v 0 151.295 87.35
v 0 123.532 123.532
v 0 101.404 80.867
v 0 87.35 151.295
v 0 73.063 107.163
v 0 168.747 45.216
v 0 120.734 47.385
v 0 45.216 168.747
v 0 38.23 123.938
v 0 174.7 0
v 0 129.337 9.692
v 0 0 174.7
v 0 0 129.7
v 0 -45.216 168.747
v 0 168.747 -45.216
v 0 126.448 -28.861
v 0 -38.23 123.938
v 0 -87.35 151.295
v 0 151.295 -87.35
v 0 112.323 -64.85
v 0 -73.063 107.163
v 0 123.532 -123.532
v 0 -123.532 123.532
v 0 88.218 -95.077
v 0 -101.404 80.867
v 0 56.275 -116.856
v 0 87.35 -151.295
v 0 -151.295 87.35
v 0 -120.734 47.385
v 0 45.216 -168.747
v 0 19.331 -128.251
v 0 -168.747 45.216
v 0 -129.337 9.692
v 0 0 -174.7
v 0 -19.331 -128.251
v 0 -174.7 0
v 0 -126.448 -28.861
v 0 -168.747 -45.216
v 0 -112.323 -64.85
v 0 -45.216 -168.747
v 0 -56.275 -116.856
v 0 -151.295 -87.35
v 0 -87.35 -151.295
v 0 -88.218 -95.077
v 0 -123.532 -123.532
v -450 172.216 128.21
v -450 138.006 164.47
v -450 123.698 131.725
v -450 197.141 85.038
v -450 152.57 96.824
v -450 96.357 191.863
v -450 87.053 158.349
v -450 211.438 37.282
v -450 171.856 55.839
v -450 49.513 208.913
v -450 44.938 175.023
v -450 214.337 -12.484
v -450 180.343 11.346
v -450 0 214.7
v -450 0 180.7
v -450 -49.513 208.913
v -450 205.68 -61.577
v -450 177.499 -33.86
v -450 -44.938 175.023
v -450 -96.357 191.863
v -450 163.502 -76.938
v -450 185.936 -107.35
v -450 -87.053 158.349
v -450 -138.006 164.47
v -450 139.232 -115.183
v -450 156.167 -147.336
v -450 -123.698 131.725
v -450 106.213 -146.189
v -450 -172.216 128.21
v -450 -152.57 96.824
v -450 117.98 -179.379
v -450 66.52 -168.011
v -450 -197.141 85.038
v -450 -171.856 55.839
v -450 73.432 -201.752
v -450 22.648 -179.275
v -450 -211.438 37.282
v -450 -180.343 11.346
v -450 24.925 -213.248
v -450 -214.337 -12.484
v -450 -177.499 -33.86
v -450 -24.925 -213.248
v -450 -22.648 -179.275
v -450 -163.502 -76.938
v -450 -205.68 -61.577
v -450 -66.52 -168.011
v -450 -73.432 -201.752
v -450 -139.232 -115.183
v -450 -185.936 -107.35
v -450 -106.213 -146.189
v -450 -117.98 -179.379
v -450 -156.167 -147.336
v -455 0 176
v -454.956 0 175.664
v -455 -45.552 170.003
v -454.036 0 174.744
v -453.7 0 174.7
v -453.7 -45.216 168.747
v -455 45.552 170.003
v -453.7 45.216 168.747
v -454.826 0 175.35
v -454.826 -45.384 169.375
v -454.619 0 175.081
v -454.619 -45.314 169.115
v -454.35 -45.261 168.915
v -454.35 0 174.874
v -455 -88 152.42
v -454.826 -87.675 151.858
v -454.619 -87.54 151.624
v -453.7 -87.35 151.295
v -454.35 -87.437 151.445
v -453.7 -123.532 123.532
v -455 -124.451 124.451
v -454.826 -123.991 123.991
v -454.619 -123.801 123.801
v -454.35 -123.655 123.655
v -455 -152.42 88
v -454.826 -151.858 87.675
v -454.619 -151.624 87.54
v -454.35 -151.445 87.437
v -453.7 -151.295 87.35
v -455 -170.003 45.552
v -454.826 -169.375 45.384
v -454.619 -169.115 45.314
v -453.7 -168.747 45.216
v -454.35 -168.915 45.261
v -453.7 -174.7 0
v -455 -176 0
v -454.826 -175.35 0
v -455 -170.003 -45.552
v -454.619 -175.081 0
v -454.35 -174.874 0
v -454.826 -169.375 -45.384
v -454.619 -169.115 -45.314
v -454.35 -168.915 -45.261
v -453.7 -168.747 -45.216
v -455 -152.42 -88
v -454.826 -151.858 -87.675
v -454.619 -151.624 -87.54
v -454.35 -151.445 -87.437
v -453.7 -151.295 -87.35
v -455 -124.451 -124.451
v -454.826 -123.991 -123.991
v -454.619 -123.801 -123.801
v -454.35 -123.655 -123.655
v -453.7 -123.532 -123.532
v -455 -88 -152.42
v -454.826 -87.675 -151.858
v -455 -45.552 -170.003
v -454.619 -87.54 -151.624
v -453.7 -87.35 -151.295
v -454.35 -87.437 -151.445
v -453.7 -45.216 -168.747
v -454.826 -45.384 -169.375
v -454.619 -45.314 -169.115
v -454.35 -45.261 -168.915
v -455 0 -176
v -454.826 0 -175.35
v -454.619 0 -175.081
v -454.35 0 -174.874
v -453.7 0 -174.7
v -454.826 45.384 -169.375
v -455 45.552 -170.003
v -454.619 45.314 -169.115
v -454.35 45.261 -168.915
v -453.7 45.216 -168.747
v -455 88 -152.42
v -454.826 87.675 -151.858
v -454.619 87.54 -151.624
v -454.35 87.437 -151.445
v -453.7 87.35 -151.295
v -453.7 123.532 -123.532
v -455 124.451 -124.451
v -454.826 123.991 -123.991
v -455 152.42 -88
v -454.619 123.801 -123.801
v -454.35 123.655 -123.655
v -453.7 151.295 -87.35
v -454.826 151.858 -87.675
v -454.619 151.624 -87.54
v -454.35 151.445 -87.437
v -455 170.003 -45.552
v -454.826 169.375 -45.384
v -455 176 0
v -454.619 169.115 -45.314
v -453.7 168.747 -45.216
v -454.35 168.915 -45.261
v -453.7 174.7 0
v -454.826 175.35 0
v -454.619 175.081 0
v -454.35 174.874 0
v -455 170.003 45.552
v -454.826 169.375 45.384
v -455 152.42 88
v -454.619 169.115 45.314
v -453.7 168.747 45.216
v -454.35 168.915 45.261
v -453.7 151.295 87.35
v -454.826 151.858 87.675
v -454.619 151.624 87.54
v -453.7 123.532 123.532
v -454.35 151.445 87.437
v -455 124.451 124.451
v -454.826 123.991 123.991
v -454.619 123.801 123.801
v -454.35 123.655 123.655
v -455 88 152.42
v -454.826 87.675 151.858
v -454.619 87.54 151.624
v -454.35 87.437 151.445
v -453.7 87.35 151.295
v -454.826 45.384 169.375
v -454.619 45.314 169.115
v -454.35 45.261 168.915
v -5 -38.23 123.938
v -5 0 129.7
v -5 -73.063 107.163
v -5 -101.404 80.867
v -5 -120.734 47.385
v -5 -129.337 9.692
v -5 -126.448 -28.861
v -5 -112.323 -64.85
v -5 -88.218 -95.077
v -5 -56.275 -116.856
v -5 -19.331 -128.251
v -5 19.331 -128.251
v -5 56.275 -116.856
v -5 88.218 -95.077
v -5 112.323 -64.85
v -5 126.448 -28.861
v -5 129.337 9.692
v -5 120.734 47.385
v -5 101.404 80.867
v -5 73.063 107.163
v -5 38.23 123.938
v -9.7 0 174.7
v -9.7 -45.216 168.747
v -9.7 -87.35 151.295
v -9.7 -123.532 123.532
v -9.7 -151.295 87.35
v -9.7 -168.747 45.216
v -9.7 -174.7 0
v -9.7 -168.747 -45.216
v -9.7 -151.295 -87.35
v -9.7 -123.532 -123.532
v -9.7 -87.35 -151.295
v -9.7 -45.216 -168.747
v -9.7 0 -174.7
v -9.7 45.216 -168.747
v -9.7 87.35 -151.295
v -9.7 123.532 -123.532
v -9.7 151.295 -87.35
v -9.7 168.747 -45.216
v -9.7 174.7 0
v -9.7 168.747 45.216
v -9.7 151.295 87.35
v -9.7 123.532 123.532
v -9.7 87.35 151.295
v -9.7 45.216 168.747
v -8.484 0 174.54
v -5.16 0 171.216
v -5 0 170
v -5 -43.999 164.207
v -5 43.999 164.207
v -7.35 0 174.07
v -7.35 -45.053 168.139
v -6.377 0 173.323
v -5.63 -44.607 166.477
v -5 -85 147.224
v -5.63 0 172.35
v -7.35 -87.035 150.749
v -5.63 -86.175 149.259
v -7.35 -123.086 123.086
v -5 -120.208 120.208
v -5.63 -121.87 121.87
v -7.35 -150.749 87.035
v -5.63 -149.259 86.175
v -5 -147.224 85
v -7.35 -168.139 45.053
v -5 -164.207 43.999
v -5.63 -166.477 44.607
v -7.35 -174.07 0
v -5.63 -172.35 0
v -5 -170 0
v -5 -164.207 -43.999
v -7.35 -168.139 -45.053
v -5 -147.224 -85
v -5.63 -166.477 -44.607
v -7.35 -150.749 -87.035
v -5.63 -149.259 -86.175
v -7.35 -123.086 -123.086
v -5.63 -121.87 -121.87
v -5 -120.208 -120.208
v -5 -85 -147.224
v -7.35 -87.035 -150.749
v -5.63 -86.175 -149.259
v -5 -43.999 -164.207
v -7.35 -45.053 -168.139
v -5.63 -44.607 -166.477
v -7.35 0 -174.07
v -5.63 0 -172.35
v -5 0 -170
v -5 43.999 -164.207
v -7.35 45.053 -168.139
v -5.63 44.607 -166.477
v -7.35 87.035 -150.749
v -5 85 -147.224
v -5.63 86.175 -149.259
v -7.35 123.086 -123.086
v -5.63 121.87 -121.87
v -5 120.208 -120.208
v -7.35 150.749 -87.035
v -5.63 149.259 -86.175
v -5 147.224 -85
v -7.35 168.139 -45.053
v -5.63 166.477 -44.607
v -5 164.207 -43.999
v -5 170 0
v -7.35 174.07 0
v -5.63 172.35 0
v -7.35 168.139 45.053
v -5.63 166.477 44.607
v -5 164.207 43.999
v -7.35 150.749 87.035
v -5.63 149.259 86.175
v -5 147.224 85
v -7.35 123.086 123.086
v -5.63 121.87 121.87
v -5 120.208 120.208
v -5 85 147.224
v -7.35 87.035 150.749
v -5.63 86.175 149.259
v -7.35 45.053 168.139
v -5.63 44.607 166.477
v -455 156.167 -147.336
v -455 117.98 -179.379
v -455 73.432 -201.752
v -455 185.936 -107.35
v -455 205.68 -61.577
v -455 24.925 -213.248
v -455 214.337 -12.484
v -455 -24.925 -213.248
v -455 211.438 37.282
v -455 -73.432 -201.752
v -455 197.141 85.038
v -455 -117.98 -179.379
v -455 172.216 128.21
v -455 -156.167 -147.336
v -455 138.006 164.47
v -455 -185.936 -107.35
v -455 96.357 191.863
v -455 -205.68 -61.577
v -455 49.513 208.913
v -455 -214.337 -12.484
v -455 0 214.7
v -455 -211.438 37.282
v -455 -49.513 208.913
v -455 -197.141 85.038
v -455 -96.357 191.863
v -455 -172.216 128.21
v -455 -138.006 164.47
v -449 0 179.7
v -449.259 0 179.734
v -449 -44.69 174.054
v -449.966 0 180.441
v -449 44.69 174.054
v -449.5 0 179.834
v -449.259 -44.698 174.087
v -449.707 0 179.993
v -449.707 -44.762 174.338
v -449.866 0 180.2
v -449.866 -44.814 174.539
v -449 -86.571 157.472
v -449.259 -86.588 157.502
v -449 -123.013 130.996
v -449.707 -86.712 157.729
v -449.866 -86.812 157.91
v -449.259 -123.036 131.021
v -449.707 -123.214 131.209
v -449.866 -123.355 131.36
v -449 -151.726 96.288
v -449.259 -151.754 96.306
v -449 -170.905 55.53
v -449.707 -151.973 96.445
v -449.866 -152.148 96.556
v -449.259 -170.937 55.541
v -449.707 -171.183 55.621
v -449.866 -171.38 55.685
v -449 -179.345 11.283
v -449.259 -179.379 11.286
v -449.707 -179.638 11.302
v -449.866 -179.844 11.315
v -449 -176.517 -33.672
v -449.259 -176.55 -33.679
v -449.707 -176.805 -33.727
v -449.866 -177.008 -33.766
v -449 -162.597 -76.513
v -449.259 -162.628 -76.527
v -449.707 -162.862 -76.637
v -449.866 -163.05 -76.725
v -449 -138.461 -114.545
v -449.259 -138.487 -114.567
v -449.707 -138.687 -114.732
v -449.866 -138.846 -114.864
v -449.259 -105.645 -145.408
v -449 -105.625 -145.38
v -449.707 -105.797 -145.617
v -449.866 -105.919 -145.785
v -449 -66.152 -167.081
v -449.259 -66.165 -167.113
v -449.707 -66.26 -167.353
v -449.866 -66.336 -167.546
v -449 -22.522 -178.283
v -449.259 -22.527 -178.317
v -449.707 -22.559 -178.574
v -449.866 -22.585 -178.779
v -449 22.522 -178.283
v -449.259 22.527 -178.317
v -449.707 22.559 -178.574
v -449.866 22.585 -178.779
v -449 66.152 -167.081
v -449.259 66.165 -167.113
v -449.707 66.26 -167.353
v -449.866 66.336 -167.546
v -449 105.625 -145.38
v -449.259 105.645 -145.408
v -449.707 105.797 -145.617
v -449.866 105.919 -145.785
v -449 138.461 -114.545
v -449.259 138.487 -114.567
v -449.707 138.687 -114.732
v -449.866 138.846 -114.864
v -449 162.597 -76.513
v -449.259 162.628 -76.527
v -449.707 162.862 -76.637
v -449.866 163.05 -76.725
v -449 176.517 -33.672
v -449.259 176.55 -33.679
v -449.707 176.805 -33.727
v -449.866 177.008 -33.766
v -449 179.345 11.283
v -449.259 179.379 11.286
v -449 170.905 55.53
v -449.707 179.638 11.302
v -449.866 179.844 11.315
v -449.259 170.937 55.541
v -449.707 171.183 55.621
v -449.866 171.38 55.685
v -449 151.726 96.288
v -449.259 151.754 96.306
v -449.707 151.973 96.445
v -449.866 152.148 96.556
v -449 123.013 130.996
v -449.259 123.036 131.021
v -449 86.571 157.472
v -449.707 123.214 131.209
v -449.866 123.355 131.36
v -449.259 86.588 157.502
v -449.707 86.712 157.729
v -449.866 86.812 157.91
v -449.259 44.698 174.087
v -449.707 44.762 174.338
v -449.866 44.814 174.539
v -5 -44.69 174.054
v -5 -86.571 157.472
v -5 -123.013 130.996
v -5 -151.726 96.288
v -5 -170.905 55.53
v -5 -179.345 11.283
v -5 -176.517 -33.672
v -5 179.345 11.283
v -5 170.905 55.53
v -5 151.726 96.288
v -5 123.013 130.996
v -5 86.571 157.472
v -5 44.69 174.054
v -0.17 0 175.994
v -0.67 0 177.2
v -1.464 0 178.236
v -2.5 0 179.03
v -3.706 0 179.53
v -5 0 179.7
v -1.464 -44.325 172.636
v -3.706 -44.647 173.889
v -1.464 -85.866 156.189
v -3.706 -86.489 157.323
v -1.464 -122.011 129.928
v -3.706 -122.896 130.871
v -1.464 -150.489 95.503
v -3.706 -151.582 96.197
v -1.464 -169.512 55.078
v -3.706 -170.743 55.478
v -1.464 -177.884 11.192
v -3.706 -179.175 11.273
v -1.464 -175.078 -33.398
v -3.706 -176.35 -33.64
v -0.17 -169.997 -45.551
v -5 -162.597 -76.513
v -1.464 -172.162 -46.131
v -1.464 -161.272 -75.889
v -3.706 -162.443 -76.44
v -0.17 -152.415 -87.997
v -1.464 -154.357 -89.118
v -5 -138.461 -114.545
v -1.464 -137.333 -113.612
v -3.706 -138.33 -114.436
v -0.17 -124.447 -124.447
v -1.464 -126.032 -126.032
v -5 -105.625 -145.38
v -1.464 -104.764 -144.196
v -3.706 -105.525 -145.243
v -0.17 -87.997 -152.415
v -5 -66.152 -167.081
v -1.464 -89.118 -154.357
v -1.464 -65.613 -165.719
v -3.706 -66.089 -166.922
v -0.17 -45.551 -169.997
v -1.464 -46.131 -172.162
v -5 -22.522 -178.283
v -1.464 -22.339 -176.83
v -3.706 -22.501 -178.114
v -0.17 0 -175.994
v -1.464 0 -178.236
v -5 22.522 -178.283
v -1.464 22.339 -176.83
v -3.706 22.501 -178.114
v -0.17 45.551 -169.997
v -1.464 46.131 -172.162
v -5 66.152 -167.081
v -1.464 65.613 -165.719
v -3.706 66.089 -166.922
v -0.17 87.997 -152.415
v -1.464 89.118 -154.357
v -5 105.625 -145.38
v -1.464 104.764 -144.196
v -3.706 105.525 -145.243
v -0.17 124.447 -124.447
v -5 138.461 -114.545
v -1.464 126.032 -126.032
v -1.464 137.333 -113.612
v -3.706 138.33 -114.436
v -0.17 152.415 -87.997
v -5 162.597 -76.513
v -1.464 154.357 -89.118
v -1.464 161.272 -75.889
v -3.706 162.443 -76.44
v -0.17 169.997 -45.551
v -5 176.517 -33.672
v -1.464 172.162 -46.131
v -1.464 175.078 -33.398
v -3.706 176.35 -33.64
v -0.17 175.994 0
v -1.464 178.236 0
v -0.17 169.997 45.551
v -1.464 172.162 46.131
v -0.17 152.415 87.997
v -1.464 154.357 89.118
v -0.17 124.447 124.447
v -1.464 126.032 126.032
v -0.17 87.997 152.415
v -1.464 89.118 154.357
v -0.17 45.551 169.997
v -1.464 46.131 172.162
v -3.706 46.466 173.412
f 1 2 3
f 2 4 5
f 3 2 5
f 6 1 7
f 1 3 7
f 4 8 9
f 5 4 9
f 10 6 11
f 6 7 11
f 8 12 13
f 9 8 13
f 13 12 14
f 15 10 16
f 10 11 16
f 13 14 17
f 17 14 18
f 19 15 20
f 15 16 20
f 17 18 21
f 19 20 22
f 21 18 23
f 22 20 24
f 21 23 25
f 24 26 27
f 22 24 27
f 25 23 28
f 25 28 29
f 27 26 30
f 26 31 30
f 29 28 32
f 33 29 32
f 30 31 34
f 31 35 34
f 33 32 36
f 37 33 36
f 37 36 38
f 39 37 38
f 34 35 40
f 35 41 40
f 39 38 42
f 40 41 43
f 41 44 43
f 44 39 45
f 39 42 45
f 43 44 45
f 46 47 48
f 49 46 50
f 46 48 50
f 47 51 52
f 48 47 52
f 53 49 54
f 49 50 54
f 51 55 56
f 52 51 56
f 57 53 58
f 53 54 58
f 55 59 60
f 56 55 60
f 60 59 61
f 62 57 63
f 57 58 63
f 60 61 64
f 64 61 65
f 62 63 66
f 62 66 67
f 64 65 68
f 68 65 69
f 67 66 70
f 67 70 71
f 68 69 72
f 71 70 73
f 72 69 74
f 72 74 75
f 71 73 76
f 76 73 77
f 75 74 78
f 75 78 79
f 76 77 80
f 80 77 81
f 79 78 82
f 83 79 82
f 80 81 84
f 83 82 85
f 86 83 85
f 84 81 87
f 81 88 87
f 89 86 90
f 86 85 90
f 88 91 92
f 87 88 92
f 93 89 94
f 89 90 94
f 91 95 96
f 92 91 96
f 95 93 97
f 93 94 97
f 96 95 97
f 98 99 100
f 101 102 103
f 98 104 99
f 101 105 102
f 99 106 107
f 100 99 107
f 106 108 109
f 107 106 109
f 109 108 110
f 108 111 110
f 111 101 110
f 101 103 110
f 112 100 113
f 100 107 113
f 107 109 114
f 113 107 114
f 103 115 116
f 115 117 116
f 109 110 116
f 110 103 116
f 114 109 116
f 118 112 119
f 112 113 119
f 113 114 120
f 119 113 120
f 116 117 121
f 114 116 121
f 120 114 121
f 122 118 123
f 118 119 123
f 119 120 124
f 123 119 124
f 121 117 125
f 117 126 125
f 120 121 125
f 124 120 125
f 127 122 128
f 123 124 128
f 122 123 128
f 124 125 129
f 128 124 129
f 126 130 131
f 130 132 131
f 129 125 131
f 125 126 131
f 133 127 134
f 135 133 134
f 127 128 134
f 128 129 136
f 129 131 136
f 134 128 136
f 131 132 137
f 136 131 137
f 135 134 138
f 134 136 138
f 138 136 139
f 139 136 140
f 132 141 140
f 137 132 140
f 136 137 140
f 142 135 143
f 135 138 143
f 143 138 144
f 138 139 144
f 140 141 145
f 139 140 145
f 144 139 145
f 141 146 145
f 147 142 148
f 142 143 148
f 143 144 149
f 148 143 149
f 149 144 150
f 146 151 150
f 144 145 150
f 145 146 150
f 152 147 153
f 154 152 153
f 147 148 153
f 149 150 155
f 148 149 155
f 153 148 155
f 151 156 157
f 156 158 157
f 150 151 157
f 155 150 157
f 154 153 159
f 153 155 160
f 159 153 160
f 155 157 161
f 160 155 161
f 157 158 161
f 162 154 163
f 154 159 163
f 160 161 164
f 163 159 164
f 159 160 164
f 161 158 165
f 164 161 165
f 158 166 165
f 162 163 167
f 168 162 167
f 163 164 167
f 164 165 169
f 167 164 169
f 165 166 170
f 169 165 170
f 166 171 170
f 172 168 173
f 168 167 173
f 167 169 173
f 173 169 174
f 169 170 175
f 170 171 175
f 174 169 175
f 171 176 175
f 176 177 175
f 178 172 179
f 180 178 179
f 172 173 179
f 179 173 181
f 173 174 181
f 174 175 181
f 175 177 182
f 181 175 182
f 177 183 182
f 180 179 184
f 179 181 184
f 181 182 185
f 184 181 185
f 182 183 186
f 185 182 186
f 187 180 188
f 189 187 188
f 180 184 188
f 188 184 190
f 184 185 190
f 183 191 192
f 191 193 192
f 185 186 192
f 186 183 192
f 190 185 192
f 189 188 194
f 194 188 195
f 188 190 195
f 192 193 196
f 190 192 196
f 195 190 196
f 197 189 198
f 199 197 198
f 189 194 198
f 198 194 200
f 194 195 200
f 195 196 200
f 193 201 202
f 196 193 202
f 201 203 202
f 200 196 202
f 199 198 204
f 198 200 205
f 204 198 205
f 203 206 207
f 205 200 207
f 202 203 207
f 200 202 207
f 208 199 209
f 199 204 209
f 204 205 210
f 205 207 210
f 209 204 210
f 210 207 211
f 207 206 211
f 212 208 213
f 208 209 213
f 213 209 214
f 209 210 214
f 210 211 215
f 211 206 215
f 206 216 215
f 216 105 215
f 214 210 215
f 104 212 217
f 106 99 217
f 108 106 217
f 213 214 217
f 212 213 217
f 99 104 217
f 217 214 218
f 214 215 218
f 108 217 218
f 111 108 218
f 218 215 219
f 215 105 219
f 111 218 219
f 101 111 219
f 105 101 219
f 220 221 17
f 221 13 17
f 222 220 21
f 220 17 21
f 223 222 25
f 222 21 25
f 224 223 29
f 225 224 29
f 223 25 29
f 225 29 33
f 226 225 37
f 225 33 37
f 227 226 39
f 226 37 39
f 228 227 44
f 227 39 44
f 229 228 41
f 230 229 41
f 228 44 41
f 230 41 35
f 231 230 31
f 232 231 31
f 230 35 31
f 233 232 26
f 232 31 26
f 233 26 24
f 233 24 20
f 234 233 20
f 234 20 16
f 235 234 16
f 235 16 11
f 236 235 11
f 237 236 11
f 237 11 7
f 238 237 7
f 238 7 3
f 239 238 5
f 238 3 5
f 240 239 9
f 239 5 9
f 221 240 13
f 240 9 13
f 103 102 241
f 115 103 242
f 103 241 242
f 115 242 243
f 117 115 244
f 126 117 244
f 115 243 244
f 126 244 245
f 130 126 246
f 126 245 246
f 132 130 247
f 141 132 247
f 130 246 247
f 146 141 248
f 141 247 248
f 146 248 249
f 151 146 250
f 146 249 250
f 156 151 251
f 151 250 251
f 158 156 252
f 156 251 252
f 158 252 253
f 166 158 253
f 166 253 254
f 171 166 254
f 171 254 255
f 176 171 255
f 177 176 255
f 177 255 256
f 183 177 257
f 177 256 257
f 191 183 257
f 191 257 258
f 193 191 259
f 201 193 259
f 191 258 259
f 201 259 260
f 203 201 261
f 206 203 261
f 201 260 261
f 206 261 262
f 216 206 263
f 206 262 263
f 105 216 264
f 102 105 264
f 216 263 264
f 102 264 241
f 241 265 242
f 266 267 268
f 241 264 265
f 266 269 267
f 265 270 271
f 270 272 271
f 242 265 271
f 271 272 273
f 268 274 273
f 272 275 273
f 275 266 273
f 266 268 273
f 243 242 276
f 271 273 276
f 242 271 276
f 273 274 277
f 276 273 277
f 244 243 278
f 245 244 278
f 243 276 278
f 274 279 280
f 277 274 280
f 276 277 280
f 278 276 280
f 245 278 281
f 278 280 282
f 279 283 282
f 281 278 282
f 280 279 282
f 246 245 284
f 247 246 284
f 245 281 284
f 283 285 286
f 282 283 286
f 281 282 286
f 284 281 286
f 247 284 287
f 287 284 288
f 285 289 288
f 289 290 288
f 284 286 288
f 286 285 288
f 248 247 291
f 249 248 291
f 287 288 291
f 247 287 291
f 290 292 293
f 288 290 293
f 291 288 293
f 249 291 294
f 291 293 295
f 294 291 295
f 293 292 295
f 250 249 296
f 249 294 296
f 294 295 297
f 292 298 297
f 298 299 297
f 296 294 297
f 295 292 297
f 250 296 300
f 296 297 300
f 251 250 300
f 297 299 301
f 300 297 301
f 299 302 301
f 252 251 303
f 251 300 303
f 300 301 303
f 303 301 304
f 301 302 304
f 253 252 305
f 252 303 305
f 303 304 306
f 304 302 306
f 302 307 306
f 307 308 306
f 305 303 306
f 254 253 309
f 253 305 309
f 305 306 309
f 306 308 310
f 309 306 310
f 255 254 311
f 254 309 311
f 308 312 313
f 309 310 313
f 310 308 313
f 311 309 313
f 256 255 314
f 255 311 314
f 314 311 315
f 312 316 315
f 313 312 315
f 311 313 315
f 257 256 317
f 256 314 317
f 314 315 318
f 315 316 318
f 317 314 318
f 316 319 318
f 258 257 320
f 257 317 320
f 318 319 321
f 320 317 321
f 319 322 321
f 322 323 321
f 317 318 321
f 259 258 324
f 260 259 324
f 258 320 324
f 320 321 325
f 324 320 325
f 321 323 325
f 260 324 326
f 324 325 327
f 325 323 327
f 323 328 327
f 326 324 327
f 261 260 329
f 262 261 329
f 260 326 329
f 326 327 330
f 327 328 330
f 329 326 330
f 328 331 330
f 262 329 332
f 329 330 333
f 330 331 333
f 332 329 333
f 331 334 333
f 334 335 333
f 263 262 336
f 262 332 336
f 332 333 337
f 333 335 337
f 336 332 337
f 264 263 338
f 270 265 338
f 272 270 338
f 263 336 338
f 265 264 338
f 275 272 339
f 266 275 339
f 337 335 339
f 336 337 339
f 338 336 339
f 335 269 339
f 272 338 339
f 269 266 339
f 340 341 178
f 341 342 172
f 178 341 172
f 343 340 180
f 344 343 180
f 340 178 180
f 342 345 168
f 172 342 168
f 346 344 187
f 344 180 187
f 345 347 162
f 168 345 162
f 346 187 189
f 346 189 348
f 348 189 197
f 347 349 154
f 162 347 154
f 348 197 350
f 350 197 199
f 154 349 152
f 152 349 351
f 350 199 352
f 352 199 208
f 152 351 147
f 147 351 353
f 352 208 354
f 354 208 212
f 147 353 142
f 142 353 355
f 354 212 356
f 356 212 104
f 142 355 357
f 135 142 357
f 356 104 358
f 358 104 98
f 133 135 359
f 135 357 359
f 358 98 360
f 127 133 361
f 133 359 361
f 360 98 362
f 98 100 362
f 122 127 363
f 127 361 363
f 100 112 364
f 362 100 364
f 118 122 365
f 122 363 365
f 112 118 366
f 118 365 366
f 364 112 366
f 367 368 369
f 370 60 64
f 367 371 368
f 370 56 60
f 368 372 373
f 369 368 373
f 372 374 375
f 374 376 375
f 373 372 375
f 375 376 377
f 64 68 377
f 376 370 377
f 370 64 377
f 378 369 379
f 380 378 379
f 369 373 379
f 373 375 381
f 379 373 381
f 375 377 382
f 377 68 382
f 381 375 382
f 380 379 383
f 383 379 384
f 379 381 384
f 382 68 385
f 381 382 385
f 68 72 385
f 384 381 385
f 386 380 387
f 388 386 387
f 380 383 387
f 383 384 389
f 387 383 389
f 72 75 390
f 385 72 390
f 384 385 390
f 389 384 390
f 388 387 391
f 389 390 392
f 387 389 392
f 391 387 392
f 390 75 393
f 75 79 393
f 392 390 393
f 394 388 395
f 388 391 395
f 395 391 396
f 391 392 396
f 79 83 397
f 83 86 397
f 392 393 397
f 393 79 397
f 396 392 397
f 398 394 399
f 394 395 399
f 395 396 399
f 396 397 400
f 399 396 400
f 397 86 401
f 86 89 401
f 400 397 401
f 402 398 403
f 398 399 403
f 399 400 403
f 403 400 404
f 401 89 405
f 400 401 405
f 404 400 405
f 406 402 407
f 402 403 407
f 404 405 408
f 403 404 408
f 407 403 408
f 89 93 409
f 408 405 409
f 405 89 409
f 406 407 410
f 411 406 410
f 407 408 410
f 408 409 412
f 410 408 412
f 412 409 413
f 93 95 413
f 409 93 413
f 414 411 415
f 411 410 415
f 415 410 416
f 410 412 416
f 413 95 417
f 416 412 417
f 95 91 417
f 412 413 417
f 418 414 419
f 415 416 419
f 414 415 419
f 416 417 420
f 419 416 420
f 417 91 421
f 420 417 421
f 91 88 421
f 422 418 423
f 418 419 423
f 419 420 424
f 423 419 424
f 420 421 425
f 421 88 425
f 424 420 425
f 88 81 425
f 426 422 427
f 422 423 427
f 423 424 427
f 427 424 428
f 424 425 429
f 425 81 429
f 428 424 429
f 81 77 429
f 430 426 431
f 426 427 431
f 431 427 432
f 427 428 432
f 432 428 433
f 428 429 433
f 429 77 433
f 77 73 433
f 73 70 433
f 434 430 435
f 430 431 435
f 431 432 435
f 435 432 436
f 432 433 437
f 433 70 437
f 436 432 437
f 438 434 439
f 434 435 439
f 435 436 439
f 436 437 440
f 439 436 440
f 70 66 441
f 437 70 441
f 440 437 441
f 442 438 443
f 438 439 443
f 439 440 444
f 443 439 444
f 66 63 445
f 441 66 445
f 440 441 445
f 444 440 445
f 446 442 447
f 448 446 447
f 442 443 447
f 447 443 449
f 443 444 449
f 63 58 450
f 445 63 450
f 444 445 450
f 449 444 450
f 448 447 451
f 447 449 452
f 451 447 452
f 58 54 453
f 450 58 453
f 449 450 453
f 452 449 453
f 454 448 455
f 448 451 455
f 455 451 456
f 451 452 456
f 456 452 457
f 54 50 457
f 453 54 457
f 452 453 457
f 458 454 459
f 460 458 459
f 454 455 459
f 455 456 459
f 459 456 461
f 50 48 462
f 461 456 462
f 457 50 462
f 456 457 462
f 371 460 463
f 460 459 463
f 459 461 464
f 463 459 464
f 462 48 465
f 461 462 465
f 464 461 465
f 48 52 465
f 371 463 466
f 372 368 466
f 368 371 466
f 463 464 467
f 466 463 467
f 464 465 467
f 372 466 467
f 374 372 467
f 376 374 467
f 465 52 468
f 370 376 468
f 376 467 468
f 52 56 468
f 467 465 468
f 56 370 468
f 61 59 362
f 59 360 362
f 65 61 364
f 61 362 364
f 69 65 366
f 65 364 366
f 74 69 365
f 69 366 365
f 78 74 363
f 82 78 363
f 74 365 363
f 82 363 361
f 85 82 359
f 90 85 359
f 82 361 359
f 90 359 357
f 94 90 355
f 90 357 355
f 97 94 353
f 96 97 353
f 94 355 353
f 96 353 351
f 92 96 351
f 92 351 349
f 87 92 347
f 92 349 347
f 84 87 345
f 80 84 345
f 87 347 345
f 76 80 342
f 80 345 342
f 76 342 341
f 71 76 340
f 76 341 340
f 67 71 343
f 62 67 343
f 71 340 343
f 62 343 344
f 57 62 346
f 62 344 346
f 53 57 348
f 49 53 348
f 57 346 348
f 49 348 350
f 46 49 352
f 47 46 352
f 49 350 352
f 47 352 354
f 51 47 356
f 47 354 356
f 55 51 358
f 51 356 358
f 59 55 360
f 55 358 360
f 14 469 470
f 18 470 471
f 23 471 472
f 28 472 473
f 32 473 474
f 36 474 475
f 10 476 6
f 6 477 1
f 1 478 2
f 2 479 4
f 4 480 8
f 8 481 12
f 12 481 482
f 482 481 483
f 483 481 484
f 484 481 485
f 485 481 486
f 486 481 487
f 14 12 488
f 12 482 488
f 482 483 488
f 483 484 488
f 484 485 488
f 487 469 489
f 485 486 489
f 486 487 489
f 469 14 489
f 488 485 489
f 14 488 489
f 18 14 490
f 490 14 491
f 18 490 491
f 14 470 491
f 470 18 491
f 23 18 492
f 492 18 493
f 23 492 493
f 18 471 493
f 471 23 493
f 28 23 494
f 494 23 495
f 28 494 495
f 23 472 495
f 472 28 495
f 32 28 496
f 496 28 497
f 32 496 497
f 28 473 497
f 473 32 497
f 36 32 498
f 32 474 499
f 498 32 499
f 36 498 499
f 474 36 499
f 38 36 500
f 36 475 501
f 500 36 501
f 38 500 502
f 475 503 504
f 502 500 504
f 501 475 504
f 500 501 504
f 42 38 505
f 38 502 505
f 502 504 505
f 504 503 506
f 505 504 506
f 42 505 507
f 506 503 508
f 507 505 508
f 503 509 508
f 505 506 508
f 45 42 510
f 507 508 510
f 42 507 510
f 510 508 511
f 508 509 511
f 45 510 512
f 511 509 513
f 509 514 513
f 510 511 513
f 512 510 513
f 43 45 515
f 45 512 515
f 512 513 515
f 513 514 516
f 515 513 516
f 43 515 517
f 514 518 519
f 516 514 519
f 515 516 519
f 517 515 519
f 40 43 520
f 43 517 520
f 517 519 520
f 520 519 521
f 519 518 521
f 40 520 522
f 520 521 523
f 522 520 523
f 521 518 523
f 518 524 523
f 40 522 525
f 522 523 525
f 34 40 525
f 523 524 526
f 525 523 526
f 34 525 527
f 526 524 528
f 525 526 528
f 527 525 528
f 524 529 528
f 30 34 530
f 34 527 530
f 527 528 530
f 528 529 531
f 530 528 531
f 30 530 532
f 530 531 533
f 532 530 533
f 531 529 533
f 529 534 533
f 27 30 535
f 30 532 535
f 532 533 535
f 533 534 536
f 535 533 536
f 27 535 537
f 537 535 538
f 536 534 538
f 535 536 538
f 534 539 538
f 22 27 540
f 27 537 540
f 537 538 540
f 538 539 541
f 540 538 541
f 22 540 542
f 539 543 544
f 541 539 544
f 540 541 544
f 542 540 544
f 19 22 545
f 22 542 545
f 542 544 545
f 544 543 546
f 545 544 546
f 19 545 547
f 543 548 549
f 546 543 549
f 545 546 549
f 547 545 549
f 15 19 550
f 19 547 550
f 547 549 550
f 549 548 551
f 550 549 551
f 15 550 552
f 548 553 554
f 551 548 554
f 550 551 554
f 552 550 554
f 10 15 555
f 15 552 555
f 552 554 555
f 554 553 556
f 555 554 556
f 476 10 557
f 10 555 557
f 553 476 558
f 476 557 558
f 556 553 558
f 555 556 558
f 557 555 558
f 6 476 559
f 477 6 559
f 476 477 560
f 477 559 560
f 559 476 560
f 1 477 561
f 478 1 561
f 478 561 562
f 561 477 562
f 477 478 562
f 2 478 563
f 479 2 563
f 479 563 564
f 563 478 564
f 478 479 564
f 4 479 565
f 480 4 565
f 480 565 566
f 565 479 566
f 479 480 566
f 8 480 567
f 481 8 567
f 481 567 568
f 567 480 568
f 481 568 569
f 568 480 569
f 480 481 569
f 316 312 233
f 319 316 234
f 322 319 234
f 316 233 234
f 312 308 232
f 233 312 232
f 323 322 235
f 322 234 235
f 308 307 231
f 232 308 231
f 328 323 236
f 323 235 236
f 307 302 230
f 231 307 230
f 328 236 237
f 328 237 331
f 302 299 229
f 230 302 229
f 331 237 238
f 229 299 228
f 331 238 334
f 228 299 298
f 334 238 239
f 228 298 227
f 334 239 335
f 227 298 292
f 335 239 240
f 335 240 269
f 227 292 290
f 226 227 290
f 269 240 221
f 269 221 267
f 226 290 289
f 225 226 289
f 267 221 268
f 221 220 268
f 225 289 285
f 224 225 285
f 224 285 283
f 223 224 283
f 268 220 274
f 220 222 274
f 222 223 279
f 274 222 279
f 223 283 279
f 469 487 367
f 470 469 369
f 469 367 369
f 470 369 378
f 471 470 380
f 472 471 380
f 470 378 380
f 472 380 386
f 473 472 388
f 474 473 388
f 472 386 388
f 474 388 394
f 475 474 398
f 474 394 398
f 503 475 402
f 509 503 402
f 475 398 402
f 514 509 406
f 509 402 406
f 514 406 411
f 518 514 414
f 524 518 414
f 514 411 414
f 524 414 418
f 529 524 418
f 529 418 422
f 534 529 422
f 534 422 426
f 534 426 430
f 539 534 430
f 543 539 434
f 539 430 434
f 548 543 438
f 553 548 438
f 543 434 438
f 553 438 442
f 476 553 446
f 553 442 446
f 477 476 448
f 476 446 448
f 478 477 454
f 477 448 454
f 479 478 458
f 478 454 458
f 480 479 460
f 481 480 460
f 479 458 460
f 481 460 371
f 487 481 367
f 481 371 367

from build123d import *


with BuildPart() as f1:
    # F0 (on Front) → F1 (revolve)
    with BuildSketch(Plane.XZ):
        with BuildLine():
            Line((-5, 179.7), (-449, 179.7))
            ThreePointArc((-449, 179.7), (-449.707107, 179.992893), (-450, 180.7))
            Line((-450, 180.7), (-450, 214.7))
            Line((-450, 214.7), (-455, 214.7))
            Line((-455, 214.7), (-455, 176))
            ThreePointArc((-455, 176), (-454.619239, 175.080761), (-453.7, 174.7))
            Line((-453.7, 174.7), (-9.7, 174.7))
            ThreePointArc((-9.7, 174.7), (-6.376598, 173.323402), (-5, 170))
            Line((-5, 170), (-5, 129.7))
            Line((-5, 129.7), (0, 129.7))
            Line((0, 129.7), (0, 174.7))
            ThreePointArc((0, 174.7), (-1.464466, 178.235534), (-5, 179.7))
        make_face()
    revolve(axis=Axis((9.014154, 0, 0), (1, 0, 0)))


solid = f1.part
